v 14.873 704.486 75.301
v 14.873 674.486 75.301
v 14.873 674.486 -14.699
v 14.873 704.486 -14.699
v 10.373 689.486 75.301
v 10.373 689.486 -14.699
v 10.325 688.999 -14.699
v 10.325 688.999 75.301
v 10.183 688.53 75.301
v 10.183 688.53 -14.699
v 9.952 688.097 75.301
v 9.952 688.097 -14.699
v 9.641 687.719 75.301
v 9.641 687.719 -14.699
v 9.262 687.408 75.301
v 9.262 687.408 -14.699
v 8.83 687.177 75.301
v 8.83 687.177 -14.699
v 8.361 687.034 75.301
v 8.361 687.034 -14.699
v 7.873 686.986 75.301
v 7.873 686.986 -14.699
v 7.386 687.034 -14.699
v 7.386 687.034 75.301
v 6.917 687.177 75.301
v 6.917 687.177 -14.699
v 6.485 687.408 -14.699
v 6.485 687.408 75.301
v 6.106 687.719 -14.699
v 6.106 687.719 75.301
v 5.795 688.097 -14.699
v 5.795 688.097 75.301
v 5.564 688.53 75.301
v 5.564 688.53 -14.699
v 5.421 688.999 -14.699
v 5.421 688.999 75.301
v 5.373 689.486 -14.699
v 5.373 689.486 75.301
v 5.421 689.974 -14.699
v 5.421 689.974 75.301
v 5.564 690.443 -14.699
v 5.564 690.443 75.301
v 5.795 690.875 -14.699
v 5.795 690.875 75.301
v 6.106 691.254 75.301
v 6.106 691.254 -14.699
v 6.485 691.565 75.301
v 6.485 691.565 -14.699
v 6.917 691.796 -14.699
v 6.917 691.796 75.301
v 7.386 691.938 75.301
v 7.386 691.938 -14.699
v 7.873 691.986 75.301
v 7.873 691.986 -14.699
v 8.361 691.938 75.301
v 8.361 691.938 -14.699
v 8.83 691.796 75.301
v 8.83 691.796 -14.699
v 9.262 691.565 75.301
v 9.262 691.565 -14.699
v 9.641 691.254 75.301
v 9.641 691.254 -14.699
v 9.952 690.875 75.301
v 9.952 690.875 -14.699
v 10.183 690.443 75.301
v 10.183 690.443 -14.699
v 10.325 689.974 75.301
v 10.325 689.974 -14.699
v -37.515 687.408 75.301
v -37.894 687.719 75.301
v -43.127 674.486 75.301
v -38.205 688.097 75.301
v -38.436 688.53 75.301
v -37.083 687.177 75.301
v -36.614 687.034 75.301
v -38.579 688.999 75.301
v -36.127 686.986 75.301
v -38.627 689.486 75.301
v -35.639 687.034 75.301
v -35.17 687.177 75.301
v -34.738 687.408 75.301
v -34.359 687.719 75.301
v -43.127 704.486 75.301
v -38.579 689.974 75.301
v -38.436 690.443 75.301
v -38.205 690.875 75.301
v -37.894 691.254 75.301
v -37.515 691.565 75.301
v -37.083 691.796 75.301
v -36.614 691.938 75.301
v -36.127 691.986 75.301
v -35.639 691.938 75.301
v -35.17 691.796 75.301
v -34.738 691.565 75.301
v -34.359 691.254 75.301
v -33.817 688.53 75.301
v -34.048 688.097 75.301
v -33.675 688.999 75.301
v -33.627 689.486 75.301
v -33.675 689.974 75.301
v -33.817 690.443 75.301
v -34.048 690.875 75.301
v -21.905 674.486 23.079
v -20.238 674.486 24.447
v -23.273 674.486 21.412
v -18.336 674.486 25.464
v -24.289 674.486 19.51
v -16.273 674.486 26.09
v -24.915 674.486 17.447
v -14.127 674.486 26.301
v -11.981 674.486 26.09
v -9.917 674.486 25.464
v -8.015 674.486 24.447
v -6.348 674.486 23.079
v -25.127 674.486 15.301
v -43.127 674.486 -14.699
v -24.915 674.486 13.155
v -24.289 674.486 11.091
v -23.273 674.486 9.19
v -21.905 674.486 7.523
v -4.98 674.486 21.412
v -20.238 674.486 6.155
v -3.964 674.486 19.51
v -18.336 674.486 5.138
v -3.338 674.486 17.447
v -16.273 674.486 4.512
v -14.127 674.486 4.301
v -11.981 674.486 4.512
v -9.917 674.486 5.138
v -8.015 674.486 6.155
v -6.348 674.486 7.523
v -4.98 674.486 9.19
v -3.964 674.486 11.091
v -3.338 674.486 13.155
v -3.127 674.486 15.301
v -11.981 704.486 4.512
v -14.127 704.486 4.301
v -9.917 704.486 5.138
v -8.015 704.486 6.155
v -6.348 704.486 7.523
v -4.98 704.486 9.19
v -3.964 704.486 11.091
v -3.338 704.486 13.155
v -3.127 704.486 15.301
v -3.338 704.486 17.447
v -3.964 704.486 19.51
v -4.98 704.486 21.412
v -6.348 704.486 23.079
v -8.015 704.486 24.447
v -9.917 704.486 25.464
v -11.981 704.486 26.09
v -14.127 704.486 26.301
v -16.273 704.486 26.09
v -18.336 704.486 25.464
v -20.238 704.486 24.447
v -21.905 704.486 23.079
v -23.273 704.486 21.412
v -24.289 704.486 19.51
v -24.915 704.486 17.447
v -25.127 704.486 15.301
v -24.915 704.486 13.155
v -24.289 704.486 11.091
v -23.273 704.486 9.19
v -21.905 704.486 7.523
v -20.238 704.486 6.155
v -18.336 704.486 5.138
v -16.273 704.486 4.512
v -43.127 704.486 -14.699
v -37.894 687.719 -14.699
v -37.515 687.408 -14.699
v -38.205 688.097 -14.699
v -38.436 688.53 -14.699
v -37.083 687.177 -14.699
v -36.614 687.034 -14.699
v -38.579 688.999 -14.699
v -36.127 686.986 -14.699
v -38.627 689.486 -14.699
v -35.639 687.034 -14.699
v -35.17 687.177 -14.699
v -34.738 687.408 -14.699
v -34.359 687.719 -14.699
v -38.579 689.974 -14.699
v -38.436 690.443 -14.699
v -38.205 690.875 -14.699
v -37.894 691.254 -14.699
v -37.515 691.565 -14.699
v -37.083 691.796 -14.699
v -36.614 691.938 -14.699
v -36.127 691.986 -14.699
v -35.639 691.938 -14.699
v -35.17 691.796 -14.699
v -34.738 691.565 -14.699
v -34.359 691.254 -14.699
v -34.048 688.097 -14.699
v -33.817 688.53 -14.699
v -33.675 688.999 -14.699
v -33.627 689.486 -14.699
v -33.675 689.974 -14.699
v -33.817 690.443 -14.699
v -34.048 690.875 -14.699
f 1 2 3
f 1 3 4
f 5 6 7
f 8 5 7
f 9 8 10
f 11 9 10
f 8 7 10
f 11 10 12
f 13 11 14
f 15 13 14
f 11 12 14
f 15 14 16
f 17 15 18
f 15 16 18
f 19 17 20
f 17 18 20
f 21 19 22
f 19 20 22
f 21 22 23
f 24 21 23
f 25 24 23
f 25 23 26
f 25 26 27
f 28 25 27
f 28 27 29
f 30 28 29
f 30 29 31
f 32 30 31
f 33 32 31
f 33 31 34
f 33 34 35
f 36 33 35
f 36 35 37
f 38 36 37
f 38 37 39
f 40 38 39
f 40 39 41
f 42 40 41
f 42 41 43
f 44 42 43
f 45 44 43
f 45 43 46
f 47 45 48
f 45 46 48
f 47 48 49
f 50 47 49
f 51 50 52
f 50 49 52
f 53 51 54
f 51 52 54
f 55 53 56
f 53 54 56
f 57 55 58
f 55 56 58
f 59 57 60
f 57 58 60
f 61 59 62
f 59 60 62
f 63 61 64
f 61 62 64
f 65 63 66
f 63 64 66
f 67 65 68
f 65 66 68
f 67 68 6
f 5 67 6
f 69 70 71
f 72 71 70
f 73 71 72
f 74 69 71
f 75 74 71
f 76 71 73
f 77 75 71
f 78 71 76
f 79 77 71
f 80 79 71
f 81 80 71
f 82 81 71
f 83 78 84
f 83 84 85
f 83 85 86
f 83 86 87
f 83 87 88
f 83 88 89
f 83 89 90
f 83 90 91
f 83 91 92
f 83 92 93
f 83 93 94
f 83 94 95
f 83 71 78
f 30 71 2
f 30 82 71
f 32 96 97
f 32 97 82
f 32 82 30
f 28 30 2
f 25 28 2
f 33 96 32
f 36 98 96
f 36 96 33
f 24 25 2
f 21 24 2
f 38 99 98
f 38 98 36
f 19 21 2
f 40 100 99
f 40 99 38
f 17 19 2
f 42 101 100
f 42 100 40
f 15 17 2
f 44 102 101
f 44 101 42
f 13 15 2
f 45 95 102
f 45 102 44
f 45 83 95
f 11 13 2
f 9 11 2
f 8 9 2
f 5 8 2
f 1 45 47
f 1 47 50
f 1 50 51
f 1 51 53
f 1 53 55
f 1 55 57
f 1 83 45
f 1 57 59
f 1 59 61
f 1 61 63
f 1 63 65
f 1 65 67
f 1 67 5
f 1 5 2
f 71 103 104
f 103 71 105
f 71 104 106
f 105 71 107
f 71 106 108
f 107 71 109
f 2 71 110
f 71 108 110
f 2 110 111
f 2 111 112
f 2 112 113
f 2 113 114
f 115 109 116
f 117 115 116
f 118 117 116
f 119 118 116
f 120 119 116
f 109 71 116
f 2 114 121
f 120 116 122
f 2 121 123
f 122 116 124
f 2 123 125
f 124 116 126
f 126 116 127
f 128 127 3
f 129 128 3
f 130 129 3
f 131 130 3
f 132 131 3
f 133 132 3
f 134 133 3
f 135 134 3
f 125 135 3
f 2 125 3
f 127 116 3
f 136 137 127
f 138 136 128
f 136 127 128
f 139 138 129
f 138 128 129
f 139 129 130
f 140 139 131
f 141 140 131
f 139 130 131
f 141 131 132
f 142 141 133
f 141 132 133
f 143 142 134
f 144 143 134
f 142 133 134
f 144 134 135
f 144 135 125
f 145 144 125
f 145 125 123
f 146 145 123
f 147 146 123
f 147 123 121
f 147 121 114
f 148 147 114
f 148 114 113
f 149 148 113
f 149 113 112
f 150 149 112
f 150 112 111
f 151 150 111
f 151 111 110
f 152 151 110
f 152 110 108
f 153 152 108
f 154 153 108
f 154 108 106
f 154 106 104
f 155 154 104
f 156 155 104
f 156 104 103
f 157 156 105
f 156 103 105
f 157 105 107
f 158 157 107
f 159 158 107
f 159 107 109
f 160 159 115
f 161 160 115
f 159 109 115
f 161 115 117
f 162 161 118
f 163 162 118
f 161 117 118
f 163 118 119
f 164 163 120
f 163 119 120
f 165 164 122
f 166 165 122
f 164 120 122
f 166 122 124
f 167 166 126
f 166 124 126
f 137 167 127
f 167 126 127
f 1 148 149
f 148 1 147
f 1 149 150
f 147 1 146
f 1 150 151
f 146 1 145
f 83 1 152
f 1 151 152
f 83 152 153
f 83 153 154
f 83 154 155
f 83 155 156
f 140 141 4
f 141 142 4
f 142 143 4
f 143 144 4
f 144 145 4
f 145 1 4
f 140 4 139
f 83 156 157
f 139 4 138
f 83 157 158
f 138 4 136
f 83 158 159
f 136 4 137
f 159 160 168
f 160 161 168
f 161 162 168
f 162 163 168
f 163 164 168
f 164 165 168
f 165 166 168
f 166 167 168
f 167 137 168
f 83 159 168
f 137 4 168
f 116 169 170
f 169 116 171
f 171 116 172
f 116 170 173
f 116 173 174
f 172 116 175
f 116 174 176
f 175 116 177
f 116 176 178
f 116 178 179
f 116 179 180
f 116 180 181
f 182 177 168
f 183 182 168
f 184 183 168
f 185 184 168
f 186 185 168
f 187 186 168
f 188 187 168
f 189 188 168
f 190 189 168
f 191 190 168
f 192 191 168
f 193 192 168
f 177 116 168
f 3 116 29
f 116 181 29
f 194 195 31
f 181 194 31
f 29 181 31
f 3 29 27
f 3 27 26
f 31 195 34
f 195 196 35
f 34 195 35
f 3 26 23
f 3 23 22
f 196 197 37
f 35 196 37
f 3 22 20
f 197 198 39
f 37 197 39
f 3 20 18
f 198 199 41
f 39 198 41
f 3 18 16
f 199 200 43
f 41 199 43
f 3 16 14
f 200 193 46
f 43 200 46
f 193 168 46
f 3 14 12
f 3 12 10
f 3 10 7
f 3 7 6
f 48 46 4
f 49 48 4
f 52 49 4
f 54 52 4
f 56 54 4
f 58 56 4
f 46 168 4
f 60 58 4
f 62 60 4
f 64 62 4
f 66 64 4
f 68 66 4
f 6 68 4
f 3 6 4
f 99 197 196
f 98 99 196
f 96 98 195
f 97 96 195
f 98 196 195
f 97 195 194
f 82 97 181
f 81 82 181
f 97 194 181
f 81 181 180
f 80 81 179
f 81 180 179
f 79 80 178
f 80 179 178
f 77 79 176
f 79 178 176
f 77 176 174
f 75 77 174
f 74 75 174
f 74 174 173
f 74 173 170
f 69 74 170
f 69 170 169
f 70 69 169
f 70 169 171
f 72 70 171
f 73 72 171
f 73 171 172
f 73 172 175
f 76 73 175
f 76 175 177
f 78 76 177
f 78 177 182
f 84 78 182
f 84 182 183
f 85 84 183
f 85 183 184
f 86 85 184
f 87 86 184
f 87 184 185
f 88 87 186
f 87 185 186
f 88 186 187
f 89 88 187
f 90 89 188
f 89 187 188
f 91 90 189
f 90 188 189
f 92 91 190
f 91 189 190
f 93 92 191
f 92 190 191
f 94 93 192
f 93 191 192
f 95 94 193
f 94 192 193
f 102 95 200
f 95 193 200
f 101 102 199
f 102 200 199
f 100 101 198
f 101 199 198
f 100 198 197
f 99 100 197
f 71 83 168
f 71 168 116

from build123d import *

# Parameters (mm, degrees)
BOSS_EXTRUDE1_DEPTH = 90
SKETCH3_R           = 11
CUT_EXTRUDE1_DEPTH  = 92.815774412
M6_TAPPED_HOLE_D    = 5


with BuildPart() as part:
    # Sketch1 → Boss-Extrude1 (new body)
    with BuildSketch(Plane(origin=(0, 2.518676762, -14.699029015), x_dir=(1, 0, 0), z_dir=(0, 0, 1))):
        Polygon((-43.126560257, 671.967635092), (-14.126560257, 671.967635092), (14.873439743, 671.967635092), (14.873439743, 701.967635092), (-43.126560257, 701.967635092), align=None)
    extrude(amount=BOSS_EXTRUDE1_DEPTH)

    # Sketch3 → Cut-Extrude1 (cut, through all)
    with BuildSketch(Plane.XZ.offset(-674.486311854)):
        with Locations(Location((-14.126560257, 15.300970985, 0), (0, 0, 270))):
            Circle(SKETCH3_R)
    extrude(amount=-CUT_EXTRUDE1_DEPTH, mode=Mode.SUBTRACT)

    # M6 Tapped Hole (through all)
    with Locations(Plane(origin=(545.719230148, 1586.957920749, 85.300970985), x_dir=(-1, 0, 0), z_dir=(0, 0, 1))):
        with Locations((514.845790405, 897.471608895), (537.845790405, 897.471608895), (581.845790405, 897.471608895), (604.845790405, 897.471608895), (514.845790405, 1450.886073068), (514.845790405, 1412.886073068), (537.845790405, 1453.886073068), (537.845790405, 1409.886073068), (581.845790405, 1453.886073068), (581.845790405, 1409.886073068), (604.845790405, 1450.886073068), (604.845790405, 1412.886073068), (514.845790405, 1431.886073068), (537.845790405, 1431.886073068), (581.845790405, 1431.886073068), (604.845790405, 1431.886073068)):
            Hole(M6_TAPPED_HOLE_D / 2)


solid = part.part
